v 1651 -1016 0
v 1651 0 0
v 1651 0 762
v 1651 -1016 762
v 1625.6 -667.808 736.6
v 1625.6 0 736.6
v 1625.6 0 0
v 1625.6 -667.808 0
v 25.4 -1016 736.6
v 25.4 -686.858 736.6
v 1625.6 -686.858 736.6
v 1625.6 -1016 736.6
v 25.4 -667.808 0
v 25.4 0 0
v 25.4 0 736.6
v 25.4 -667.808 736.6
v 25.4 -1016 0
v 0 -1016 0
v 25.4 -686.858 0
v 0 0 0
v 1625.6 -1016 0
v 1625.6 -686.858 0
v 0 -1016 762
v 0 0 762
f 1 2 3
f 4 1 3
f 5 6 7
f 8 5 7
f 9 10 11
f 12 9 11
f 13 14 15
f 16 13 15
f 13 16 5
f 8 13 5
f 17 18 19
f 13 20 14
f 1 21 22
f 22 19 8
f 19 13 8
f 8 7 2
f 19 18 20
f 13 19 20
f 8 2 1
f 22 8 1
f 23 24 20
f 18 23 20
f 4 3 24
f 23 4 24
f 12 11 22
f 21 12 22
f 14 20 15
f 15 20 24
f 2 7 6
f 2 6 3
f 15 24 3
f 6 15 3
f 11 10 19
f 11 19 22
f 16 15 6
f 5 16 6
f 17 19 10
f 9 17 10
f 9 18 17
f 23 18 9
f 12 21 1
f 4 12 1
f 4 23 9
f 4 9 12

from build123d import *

# Parameters (mm, degrees)
F3_DEPTH = 1016
F4_W     = 1600.2
F4_H     = 19.05
F5_DEPTH = 736.6


with BuildPart() as f3:
    # F2 (on Front) → F3 (new body)
    with BuildSketch(Plane.XZ):
        Polygon((0, 762), (0, 0), (25.4, 0), (25.4, 736.6), align=None)
        Polygon((1651, 762), (0, 762), (25.4, 736.6), (1625.6, 736.6), align=None)
        Polygon((1651, 0), (1651, 762), (1625.6, 736.6), (1625.6, 0), align=None)
    extrude(amount=F3_DEPTH)

    # F4 (on face) → F5 (join, through all)
    with BuildSketch(Plane(origin=(0, 0, 736.6), x_dir=(1, 0, 0), z_dir=(0, 0, -1))):
        with Locations((825.5, 677.3333333333)):
            Rectangle(F4_W, F4_H)
    extrude(amount=F5_DEPTH)


solid = f3.part
